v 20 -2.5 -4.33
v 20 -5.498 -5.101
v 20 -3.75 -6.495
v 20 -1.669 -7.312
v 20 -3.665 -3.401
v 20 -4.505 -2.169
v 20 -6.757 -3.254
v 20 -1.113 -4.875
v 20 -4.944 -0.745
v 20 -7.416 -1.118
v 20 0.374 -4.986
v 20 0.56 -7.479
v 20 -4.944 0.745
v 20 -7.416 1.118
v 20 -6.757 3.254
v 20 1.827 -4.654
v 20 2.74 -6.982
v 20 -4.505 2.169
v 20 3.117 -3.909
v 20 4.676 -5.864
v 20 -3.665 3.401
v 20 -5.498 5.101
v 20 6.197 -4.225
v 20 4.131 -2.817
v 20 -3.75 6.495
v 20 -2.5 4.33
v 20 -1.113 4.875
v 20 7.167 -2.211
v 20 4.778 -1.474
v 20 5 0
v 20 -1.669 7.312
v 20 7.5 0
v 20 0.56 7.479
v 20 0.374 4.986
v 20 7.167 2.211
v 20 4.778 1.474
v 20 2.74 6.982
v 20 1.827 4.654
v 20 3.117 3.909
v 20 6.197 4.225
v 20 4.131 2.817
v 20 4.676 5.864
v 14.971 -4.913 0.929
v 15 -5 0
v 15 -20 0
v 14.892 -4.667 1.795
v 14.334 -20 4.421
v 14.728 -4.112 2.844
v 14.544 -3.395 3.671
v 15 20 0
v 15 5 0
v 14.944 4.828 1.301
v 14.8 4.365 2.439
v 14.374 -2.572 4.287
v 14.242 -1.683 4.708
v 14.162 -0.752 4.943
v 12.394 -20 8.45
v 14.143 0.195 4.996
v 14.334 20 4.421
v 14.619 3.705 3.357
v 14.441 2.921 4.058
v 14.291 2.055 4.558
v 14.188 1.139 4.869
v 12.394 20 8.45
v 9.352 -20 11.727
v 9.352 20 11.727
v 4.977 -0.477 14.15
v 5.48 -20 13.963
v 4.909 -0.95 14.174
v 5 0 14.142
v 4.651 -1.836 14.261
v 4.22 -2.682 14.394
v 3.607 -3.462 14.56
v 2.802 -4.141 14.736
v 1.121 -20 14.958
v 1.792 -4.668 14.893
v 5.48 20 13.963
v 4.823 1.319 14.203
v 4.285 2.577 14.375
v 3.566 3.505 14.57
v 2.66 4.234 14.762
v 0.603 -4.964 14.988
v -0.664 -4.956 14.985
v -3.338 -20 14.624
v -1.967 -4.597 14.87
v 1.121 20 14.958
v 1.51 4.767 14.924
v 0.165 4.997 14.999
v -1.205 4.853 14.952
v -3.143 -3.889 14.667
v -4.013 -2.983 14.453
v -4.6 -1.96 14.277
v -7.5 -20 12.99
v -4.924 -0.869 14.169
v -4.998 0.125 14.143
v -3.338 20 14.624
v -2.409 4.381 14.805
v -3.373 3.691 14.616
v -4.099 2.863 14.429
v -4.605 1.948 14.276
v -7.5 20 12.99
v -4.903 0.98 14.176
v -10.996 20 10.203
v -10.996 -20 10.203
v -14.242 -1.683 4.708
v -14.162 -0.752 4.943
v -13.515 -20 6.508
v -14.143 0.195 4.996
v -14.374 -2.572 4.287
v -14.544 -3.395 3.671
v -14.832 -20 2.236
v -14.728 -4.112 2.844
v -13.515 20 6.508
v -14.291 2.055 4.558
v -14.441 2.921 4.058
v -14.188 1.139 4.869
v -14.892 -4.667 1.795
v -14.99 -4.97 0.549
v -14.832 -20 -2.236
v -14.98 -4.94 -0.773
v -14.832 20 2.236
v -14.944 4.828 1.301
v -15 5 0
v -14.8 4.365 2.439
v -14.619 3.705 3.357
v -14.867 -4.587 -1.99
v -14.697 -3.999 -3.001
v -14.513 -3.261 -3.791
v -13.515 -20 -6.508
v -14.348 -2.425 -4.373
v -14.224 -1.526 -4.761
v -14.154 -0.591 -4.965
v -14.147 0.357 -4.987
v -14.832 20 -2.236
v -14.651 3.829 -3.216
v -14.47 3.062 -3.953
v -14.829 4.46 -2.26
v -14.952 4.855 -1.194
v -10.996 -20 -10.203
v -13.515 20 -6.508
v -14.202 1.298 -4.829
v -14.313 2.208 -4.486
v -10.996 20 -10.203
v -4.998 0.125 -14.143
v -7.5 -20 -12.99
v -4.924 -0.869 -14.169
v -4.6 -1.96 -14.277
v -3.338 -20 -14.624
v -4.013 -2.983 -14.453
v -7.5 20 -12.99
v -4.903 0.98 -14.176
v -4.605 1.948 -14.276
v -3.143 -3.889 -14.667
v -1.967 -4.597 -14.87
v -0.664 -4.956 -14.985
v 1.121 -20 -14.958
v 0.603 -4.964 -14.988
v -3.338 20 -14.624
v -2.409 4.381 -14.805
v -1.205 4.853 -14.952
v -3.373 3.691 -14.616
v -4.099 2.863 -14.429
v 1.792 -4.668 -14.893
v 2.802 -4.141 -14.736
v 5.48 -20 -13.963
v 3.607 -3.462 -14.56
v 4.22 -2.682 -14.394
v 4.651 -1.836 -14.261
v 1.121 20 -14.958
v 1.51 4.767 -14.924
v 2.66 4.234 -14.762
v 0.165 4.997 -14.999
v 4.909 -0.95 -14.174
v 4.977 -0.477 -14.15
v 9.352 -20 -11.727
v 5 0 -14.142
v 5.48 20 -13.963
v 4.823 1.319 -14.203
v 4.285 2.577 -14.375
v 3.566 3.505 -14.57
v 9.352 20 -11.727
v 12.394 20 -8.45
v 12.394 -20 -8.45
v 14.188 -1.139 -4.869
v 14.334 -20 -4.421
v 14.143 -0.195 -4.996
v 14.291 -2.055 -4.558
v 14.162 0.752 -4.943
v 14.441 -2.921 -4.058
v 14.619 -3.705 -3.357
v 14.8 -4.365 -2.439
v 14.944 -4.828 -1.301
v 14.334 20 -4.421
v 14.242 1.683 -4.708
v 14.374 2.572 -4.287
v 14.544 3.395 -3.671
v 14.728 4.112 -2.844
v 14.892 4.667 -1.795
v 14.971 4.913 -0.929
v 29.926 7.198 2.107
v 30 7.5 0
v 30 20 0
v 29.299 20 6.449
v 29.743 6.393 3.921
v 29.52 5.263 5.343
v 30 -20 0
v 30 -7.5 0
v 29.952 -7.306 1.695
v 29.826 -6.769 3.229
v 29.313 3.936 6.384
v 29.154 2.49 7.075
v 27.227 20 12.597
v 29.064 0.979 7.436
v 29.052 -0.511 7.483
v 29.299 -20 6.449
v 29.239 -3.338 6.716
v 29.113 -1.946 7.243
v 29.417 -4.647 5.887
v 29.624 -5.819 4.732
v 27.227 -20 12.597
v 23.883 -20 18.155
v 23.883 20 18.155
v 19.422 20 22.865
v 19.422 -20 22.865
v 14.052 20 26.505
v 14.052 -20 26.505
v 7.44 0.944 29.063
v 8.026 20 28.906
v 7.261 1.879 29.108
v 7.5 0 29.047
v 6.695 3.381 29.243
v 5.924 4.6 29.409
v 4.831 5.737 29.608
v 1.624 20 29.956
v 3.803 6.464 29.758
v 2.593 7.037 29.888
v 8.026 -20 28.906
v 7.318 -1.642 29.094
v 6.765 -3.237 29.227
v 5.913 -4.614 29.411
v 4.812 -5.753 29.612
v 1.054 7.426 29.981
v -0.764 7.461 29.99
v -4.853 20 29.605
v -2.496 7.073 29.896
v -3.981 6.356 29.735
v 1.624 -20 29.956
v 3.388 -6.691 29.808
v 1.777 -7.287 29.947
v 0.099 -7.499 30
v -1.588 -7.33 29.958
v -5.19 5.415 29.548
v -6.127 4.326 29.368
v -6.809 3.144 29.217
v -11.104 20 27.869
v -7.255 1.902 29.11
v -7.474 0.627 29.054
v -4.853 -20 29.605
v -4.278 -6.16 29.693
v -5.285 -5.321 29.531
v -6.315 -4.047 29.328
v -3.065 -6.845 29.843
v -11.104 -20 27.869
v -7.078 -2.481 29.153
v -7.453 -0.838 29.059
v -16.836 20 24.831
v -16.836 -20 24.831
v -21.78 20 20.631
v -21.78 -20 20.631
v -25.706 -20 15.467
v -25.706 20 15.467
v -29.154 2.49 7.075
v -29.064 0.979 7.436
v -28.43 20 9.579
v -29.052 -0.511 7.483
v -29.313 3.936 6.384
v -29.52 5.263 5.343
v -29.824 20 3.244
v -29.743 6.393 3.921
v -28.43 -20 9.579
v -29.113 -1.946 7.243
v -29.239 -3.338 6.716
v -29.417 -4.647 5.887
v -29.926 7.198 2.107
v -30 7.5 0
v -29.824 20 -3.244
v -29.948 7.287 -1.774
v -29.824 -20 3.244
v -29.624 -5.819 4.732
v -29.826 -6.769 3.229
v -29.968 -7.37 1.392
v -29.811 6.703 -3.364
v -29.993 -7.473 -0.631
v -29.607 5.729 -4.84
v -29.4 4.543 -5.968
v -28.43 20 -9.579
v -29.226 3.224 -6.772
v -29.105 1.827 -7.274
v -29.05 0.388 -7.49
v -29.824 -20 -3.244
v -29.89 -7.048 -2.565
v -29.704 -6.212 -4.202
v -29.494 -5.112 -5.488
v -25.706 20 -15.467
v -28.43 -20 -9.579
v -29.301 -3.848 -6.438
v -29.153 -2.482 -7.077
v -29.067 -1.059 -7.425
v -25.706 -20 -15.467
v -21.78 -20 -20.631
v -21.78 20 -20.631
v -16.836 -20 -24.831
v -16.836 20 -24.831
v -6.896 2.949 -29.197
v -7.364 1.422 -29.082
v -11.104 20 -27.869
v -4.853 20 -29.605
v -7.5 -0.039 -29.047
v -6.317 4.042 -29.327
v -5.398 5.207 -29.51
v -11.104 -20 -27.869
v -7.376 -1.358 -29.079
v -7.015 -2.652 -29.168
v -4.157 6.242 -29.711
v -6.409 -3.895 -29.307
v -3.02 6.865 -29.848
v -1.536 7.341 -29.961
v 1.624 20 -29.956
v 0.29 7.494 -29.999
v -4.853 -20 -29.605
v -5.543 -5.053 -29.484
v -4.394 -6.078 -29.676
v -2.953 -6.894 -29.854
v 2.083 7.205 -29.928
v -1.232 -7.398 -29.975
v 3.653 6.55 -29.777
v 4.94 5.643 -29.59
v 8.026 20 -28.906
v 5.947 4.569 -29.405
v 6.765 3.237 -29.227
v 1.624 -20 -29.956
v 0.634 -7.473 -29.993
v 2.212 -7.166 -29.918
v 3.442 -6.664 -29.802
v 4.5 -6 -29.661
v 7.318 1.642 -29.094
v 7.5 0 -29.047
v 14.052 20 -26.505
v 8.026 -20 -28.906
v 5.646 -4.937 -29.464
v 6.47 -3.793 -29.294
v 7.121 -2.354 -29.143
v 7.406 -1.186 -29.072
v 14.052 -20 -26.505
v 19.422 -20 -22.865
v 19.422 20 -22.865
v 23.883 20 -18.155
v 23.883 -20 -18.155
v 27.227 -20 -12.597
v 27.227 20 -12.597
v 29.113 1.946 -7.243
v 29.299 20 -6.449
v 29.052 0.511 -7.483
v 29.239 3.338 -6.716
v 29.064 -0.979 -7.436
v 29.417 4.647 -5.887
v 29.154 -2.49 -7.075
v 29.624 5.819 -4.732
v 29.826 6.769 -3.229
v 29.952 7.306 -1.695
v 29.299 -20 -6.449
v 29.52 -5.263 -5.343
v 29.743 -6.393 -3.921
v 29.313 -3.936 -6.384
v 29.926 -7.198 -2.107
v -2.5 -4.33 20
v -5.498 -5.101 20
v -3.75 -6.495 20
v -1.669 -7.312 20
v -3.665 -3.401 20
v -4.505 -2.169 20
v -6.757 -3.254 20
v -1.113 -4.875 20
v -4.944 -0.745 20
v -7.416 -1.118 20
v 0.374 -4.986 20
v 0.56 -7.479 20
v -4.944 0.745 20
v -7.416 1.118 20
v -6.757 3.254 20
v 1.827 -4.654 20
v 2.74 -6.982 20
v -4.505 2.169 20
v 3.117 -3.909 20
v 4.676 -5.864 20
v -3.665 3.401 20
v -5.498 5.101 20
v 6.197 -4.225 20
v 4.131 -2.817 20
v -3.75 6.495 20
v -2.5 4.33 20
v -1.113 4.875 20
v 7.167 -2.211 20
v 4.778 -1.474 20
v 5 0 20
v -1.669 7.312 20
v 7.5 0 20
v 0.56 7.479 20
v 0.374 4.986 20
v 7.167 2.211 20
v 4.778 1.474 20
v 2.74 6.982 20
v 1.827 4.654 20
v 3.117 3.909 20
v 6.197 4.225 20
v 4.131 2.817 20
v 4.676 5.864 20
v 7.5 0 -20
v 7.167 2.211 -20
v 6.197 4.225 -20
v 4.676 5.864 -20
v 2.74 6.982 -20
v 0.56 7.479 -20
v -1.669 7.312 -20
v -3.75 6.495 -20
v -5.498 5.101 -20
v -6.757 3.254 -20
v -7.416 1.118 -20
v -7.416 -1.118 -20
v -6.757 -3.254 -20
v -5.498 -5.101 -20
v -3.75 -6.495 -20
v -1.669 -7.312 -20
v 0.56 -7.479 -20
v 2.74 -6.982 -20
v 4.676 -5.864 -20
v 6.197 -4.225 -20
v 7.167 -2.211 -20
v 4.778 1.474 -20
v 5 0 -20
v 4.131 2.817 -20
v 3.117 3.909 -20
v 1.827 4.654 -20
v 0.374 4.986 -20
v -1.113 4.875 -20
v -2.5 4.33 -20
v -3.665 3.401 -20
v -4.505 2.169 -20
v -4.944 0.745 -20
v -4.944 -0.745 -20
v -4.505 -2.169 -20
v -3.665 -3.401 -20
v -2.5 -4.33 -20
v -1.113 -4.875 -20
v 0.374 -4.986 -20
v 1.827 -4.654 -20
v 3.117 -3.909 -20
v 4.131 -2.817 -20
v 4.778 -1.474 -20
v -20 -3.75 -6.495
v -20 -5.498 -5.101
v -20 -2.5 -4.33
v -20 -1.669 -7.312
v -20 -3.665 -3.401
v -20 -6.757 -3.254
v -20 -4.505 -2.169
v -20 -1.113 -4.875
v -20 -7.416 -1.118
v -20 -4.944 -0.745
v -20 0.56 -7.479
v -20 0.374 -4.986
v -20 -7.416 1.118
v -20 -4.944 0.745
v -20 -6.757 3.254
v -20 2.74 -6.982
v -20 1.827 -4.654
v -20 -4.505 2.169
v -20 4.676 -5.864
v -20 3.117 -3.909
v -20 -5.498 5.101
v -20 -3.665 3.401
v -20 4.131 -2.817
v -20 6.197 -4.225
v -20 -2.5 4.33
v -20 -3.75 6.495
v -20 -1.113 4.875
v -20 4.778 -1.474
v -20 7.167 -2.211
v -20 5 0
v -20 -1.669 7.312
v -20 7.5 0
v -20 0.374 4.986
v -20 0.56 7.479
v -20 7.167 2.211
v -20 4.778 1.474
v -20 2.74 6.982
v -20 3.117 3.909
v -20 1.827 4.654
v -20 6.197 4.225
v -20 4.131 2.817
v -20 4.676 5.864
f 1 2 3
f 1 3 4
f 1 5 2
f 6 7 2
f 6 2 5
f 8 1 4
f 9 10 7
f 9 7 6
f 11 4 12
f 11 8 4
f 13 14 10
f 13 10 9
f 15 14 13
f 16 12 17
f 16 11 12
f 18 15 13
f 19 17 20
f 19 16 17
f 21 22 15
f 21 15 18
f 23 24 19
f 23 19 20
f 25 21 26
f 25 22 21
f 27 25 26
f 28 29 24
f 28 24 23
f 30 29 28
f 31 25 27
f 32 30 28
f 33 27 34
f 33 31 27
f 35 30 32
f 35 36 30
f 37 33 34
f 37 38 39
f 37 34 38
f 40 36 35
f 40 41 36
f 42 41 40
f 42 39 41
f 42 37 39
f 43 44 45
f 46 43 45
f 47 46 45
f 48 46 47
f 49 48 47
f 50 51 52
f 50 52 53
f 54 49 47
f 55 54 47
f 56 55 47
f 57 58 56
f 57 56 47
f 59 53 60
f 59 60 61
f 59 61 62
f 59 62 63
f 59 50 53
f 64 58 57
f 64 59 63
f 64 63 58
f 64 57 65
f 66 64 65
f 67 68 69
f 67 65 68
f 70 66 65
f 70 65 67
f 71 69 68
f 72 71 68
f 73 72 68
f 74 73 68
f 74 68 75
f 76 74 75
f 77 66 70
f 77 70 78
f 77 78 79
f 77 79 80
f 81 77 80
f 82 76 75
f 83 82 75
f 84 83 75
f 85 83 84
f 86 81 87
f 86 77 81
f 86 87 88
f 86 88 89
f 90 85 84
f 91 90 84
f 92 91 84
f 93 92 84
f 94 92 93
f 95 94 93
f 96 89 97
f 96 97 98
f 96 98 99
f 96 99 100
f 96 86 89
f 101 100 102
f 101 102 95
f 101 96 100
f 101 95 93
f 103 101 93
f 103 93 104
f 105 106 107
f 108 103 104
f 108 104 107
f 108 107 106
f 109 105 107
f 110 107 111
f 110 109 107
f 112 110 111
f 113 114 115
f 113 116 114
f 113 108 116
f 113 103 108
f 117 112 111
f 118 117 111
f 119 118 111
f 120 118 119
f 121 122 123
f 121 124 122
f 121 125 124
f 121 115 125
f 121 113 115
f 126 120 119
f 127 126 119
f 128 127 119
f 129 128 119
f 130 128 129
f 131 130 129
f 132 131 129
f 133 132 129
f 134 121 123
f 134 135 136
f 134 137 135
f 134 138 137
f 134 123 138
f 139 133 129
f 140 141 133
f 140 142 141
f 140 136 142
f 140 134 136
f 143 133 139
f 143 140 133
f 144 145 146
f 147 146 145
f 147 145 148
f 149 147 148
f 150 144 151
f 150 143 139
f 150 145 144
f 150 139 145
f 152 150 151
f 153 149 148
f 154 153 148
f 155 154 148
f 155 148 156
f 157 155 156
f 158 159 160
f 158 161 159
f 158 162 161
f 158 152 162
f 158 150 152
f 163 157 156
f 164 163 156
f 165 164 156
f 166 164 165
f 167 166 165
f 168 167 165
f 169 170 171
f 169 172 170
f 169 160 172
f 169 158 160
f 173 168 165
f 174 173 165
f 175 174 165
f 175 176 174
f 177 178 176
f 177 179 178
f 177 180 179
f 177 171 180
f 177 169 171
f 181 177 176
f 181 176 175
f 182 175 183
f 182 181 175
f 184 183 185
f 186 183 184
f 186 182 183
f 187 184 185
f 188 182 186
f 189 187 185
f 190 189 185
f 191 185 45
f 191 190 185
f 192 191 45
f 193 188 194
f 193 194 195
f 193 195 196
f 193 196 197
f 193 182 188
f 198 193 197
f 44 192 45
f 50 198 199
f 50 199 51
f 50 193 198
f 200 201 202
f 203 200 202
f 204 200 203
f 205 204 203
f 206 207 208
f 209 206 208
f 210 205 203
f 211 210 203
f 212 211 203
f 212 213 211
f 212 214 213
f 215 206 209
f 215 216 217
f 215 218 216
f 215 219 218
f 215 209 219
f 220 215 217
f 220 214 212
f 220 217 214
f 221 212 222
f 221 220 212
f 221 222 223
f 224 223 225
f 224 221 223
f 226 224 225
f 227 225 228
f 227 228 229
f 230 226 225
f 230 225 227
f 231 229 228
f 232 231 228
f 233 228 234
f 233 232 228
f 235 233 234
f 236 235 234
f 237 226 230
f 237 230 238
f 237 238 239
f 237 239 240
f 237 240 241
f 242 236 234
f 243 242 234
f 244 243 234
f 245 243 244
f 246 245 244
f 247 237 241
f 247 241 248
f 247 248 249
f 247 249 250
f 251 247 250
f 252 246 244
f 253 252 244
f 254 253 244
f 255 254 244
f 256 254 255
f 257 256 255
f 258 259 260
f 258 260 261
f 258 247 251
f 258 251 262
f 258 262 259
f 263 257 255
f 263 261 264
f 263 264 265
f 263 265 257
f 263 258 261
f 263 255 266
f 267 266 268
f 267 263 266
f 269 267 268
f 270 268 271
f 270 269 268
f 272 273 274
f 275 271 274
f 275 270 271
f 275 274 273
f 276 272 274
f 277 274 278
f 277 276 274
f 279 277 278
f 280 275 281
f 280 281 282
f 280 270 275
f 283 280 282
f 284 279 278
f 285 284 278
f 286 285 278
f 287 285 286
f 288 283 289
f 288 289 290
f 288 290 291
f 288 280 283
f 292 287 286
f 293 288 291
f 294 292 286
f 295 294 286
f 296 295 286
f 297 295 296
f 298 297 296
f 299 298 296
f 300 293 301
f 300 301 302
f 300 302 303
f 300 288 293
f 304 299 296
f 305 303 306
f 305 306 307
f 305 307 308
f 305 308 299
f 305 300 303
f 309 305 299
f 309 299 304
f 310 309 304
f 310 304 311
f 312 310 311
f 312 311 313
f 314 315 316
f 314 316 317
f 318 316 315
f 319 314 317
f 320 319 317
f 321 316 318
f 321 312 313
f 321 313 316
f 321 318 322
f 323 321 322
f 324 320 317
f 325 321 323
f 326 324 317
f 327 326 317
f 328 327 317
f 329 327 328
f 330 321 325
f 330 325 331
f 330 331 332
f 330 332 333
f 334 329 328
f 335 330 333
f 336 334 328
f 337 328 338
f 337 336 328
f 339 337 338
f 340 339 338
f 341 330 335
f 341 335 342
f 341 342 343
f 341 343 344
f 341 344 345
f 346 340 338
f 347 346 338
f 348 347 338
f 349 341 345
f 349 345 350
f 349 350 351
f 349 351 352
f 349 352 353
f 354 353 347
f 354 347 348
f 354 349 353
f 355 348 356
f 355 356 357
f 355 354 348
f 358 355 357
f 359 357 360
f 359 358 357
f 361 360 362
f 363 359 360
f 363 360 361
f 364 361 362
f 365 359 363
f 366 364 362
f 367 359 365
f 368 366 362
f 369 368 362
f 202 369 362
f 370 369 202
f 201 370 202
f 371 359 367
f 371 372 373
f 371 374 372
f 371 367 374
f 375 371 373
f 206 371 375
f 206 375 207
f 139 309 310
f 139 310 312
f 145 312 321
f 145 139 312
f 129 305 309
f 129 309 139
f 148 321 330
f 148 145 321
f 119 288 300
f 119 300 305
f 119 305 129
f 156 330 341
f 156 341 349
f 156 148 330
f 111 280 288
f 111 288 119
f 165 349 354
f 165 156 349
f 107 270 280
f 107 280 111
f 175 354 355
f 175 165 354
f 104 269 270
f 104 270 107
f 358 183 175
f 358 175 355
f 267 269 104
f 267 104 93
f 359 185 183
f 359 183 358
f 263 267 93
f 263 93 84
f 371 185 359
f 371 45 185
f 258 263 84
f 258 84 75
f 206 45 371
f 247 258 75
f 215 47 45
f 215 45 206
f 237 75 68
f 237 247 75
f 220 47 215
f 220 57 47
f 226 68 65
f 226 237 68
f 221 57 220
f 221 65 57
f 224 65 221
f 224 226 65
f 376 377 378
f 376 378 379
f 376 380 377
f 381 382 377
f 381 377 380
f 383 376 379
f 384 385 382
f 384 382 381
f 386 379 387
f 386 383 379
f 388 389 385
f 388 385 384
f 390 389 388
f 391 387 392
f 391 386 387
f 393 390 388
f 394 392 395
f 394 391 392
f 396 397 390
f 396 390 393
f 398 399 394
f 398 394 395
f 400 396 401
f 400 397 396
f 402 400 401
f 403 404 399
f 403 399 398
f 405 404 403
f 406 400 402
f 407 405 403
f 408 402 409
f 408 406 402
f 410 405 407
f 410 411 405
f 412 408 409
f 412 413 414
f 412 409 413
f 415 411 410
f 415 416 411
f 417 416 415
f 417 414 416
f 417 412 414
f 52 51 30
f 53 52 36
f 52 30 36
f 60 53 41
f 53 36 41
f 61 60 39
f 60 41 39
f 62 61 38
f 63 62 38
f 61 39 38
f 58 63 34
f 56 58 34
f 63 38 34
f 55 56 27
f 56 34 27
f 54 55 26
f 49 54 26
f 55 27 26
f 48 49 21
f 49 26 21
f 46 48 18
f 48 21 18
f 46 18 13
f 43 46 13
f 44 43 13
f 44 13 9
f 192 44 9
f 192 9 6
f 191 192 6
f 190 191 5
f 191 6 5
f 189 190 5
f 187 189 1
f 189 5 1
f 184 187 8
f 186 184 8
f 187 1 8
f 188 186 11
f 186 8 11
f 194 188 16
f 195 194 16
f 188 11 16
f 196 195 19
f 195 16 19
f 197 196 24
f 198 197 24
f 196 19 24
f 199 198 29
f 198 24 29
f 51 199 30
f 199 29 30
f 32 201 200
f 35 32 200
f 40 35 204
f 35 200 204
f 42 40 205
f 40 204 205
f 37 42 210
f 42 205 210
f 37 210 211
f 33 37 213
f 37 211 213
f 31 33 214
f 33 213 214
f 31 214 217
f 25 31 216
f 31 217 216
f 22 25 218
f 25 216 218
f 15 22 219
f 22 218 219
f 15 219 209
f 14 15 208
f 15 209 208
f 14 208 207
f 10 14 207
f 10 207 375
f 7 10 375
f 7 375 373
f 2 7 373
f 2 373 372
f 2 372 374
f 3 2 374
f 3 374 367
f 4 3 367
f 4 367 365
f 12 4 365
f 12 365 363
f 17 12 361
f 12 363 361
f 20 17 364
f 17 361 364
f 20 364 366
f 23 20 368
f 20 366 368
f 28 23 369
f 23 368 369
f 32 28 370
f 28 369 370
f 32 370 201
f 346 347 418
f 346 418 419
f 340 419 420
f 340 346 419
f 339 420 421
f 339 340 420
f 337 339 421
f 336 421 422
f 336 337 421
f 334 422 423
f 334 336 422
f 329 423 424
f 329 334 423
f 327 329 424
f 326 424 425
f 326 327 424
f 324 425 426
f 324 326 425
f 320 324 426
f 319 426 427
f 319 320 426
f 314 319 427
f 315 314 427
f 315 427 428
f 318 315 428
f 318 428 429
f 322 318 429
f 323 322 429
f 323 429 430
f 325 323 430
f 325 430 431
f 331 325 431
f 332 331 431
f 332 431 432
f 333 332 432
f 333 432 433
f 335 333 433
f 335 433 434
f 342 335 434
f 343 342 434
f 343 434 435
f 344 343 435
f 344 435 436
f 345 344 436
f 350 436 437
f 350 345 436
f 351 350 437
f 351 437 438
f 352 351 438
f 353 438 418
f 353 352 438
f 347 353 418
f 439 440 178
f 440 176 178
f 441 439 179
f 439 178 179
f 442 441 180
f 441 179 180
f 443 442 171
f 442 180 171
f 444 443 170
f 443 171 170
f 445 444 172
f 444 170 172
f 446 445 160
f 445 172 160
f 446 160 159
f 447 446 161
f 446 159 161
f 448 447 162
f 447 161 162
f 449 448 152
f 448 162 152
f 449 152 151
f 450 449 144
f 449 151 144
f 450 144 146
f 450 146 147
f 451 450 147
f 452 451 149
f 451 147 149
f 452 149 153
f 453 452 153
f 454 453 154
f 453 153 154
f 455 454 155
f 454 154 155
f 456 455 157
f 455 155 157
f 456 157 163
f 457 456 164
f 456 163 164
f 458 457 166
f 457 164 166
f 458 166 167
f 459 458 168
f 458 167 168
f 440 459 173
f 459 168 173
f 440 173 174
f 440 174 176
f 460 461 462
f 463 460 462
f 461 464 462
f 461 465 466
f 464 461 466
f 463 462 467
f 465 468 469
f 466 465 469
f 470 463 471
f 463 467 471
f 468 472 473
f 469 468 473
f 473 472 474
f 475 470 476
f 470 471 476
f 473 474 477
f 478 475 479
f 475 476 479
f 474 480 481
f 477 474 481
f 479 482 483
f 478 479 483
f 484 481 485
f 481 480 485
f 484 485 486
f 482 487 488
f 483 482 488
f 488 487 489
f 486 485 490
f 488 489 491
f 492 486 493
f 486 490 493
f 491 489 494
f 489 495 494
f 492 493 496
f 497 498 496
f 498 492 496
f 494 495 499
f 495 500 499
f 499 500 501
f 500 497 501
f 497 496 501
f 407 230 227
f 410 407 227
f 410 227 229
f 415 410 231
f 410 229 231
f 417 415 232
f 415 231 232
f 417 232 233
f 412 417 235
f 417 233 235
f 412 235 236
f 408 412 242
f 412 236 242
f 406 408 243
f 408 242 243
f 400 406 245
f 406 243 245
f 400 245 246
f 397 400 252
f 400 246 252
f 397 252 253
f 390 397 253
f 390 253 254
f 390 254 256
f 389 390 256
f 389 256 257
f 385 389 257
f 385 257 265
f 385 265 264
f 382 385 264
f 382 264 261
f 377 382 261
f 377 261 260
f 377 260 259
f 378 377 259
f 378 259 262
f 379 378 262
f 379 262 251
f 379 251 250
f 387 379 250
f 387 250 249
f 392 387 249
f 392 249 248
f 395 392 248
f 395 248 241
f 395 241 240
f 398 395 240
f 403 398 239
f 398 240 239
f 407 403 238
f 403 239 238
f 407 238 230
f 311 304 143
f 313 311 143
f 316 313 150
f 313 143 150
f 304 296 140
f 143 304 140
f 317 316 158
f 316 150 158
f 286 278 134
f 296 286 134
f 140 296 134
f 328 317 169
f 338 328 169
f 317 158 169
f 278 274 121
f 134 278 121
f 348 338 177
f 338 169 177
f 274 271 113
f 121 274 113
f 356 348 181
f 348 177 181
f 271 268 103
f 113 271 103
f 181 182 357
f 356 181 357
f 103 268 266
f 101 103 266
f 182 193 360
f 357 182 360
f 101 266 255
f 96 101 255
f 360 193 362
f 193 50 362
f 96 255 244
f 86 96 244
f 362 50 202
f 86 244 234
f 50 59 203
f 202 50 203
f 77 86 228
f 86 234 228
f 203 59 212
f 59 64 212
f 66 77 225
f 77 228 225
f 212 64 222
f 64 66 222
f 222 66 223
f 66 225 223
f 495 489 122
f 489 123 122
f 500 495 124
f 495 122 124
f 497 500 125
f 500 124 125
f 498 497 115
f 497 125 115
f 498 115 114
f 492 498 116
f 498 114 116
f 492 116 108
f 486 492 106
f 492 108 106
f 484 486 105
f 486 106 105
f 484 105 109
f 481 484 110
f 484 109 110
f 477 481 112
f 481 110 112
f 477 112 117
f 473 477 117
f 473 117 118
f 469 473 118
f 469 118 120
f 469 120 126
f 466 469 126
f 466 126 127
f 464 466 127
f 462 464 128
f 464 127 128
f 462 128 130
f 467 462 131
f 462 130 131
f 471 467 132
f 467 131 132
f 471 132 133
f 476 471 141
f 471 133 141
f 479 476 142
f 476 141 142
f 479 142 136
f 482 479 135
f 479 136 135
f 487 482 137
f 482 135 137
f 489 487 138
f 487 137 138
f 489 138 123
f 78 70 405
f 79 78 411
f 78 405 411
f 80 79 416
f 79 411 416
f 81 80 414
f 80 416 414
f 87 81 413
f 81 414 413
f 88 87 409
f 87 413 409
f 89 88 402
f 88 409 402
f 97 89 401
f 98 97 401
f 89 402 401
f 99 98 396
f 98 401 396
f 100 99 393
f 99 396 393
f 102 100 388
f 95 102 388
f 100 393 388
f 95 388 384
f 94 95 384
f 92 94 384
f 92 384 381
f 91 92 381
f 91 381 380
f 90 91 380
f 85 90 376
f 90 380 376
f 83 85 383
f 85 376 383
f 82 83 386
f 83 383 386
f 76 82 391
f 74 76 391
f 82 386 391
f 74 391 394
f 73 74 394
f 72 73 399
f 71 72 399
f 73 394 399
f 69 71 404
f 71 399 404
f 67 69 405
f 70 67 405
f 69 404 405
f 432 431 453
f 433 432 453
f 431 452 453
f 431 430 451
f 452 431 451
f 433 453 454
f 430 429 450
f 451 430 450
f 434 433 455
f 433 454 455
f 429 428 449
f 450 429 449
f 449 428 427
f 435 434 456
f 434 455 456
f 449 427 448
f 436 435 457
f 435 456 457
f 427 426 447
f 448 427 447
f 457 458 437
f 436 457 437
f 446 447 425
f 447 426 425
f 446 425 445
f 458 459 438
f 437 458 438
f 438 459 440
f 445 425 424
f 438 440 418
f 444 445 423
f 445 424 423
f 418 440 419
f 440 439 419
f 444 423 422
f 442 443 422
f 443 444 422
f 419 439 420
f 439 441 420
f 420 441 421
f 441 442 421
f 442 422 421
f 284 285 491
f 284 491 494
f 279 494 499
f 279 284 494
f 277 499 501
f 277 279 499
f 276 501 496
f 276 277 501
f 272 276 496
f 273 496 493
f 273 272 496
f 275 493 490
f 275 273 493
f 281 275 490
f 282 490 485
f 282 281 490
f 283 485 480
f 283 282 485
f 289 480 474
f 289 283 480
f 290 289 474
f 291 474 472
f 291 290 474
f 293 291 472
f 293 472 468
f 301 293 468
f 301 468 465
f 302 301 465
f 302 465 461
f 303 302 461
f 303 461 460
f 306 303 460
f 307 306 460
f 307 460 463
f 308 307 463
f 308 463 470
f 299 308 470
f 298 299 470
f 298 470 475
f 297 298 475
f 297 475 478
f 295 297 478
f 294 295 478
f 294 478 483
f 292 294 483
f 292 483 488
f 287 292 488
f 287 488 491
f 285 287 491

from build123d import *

# Parameters (mm, degrees)
F0_R      = 30
F0_R_2    = 15
F1_DEPTH  = 20
F2_R      = 5
F3_DEPTH  = 50.4
F6_R      = 7.5
F7_DEPTH  = 10
F8_R      = 7.5
F9_DEPTH  = 10
F10_R     = 5
F11_DEPTH = 44.6
F13_R     = 7.5
F14_DEPTH = 10
F16_R     = 7.5
F17_DEPTH = 10


with BuildPart() as f1:
    # F0 (on Front) → F1 (new body, symmetric)
    with BuildSketch(Plane.XZ):
        Circle(F0_R)
        Circle(F0_R_2, mode=Mode.SUBTRACT)
    extrude(amount=F1_DEPTH, both=True)

    # F2 (on Top) → F3 (cut, symmetric)
    with BuildSketch(Plane.XY):
        Circle(F2_R)
    extrude(amount=F3_DEPTH, both=True, mode=Mode.SUBTRACT)

    # F6 (on offset) → F7 (cut)
    with BuildSketch(Plane.XY.offset(30)):
        Circle(F6_R)
    extrude(amount=-F7_DEPTH, mode=Mode.SUBTRACT)

    # F8 (on offset) → F9 (cut)
    with BuildSketch(Plane.XY.offset(-30)):
        Circle(F8_R)
    extrude(amount=F9_DEPTH, mode=Mode.SUBTRACT)

    # F10 (on Right) → F11 (cut, symmetric)
    with BuildSketch(Plane.YZ):
        Circle(F10_R)
    extrude(amount=F11_DEPTH, both=True, mode=Mode.SUBTRACT)

    # F13 (on offset) → F14 (cut)
    with BuildSketch(Plane.YZ.offset(30)):
        Circle(F13_R)
    extrude(amount=-F14_DEPTH, mode=Mode.SUBTRACT)

    # F16 (on offset) → F17 (cut)
    with BuildSketch(Plane.YZ.offset(-30)):
        Circle(F16_R)
    extrude(amount=F17_DEPTH, mode=Mode.SUBTRACT)


solid = f1.part
